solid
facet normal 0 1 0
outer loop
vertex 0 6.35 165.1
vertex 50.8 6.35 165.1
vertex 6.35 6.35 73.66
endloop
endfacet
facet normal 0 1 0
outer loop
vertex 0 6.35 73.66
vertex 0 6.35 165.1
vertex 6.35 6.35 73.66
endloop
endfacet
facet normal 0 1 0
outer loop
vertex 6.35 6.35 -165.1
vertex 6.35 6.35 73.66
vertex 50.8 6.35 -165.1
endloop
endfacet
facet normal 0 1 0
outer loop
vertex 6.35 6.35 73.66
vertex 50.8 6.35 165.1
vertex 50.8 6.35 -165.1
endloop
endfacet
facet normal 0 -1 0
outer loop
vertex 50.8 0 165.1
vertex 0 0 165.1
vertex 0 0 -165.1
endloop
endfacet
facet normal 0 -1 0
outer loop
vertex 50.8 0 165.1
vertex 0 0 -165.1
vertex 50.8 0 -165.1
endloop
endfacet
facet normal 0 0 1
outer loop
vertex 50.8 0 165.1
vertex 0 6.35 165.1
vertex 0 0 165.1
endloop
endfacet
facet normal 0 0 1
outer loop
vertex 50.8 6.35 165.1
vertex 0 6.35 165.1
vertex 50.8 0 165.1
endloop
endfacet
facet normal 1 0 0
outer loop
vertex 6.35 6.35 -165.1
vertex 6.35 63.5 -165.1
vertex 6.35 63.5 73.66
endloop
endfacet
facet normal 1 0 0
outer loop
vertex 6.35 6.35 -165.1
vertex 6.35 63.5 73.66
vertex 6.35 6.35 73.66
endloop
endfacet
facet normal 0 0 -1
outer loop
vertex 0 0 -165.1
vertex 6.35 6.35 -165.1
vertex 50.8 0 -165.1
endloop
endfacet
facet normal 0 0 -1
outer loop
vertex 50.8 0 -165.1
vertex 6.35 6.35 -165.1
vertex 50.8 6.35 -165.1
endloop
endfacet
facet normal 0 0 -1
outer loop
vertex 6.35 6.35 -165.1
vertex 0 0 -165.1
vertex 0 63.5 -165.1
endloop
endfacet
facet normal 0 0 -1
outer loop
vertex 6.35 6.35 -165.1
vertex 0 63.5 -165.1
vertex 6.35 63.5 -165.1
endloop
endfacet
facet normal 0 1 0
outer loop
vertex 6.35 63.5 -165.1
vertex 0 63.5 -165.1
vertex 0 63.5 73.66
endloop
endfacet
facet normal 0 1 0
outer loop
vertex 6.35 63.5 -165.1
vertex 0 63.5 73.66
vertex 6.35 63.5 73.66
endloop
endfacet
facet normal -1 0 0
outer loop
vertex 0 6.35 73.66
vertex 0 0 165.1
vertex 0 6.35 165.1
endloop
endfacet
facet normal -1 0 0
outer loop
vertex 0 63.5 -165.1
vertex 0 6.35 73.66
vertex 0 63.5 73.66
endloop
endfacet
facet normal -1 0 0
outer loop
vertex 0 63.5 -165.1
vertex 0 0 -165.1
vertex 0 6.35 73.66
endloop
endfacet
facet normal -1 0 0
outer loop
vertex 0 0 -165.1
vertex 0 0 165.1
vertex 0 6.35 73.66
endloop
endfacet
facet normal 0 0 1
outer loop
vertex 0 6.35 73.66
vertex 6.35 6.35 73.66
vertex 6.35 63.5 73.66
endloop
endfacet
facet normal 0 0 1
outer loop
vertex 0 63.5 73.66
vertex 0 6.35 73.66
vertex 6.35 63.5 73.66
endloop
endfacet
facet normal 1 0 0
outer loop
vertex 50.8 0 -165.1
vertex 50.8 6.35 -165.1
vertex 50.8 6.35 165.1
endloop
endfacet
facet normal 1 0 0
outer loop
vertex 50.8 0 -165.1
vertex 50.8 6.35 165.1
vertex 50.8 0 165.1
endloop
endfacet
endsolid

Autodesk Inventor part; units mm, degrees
ref_plane "YZ Plane" through (0, 0, 0) normal (1, 0, 0) x (0, 1, 0)
ref_plane "XZ Plane" through (0, 0, 0) normal (0, 1, 0) x (-1, 0, 0)
ref_plane "XY Plane" through (0, 0, 0) normal (0, 0, 1) x (1, 0, 0)
sketch "Sketch1" plane through (0, 0, 0) normal (0, 0, 1) x (1, 0, 0)
  line L0 (0, 0) -> (50.8, 0)
  line L1 (0, 0) -> (0, 63.5)
  line L2 (0, 63.5) -> (6.35, 63.5)
  line L3 (6.35, 63.5) -> (6.35, 6.35)
  line L4 (6.35, 6.35) -> (50.8, 6.35)
  line L5 (50.8, 6.35) -> (50.8, 0)
  dimension "d0" = 50.8
  dimension "d1" = 63.5
  dimension "d2" = 6.35
  dimension "d3" = 6.35
extrude "Extrusion1" add sketch "Sketch1" along normal mid plane 330.2
sketch "Sketch3" plane through (6.35, 6.35, 165.1) normal (1, 0, 0) x (0, 0, -1)
  line L0 (0, 0) -> (0, 57.15) projected
  line L1 (330.2, 57.15) -> (0, 57.15) projected
  line L2 (0, 0) -> (91.44, 0)
  line L3 (91.44, 0) -> (91.44, 57.15)
  line L4 (91.44, 57.15) -> (0, 57.15)
  line L5 (0, 57.15) -> (0, 0)
  point P0 (165.1, -6.35)
  dimension "d6" = 91.44
extrude "Extrusion2" cut sketch "Sketch3" against normal through all
properties part number "base"
